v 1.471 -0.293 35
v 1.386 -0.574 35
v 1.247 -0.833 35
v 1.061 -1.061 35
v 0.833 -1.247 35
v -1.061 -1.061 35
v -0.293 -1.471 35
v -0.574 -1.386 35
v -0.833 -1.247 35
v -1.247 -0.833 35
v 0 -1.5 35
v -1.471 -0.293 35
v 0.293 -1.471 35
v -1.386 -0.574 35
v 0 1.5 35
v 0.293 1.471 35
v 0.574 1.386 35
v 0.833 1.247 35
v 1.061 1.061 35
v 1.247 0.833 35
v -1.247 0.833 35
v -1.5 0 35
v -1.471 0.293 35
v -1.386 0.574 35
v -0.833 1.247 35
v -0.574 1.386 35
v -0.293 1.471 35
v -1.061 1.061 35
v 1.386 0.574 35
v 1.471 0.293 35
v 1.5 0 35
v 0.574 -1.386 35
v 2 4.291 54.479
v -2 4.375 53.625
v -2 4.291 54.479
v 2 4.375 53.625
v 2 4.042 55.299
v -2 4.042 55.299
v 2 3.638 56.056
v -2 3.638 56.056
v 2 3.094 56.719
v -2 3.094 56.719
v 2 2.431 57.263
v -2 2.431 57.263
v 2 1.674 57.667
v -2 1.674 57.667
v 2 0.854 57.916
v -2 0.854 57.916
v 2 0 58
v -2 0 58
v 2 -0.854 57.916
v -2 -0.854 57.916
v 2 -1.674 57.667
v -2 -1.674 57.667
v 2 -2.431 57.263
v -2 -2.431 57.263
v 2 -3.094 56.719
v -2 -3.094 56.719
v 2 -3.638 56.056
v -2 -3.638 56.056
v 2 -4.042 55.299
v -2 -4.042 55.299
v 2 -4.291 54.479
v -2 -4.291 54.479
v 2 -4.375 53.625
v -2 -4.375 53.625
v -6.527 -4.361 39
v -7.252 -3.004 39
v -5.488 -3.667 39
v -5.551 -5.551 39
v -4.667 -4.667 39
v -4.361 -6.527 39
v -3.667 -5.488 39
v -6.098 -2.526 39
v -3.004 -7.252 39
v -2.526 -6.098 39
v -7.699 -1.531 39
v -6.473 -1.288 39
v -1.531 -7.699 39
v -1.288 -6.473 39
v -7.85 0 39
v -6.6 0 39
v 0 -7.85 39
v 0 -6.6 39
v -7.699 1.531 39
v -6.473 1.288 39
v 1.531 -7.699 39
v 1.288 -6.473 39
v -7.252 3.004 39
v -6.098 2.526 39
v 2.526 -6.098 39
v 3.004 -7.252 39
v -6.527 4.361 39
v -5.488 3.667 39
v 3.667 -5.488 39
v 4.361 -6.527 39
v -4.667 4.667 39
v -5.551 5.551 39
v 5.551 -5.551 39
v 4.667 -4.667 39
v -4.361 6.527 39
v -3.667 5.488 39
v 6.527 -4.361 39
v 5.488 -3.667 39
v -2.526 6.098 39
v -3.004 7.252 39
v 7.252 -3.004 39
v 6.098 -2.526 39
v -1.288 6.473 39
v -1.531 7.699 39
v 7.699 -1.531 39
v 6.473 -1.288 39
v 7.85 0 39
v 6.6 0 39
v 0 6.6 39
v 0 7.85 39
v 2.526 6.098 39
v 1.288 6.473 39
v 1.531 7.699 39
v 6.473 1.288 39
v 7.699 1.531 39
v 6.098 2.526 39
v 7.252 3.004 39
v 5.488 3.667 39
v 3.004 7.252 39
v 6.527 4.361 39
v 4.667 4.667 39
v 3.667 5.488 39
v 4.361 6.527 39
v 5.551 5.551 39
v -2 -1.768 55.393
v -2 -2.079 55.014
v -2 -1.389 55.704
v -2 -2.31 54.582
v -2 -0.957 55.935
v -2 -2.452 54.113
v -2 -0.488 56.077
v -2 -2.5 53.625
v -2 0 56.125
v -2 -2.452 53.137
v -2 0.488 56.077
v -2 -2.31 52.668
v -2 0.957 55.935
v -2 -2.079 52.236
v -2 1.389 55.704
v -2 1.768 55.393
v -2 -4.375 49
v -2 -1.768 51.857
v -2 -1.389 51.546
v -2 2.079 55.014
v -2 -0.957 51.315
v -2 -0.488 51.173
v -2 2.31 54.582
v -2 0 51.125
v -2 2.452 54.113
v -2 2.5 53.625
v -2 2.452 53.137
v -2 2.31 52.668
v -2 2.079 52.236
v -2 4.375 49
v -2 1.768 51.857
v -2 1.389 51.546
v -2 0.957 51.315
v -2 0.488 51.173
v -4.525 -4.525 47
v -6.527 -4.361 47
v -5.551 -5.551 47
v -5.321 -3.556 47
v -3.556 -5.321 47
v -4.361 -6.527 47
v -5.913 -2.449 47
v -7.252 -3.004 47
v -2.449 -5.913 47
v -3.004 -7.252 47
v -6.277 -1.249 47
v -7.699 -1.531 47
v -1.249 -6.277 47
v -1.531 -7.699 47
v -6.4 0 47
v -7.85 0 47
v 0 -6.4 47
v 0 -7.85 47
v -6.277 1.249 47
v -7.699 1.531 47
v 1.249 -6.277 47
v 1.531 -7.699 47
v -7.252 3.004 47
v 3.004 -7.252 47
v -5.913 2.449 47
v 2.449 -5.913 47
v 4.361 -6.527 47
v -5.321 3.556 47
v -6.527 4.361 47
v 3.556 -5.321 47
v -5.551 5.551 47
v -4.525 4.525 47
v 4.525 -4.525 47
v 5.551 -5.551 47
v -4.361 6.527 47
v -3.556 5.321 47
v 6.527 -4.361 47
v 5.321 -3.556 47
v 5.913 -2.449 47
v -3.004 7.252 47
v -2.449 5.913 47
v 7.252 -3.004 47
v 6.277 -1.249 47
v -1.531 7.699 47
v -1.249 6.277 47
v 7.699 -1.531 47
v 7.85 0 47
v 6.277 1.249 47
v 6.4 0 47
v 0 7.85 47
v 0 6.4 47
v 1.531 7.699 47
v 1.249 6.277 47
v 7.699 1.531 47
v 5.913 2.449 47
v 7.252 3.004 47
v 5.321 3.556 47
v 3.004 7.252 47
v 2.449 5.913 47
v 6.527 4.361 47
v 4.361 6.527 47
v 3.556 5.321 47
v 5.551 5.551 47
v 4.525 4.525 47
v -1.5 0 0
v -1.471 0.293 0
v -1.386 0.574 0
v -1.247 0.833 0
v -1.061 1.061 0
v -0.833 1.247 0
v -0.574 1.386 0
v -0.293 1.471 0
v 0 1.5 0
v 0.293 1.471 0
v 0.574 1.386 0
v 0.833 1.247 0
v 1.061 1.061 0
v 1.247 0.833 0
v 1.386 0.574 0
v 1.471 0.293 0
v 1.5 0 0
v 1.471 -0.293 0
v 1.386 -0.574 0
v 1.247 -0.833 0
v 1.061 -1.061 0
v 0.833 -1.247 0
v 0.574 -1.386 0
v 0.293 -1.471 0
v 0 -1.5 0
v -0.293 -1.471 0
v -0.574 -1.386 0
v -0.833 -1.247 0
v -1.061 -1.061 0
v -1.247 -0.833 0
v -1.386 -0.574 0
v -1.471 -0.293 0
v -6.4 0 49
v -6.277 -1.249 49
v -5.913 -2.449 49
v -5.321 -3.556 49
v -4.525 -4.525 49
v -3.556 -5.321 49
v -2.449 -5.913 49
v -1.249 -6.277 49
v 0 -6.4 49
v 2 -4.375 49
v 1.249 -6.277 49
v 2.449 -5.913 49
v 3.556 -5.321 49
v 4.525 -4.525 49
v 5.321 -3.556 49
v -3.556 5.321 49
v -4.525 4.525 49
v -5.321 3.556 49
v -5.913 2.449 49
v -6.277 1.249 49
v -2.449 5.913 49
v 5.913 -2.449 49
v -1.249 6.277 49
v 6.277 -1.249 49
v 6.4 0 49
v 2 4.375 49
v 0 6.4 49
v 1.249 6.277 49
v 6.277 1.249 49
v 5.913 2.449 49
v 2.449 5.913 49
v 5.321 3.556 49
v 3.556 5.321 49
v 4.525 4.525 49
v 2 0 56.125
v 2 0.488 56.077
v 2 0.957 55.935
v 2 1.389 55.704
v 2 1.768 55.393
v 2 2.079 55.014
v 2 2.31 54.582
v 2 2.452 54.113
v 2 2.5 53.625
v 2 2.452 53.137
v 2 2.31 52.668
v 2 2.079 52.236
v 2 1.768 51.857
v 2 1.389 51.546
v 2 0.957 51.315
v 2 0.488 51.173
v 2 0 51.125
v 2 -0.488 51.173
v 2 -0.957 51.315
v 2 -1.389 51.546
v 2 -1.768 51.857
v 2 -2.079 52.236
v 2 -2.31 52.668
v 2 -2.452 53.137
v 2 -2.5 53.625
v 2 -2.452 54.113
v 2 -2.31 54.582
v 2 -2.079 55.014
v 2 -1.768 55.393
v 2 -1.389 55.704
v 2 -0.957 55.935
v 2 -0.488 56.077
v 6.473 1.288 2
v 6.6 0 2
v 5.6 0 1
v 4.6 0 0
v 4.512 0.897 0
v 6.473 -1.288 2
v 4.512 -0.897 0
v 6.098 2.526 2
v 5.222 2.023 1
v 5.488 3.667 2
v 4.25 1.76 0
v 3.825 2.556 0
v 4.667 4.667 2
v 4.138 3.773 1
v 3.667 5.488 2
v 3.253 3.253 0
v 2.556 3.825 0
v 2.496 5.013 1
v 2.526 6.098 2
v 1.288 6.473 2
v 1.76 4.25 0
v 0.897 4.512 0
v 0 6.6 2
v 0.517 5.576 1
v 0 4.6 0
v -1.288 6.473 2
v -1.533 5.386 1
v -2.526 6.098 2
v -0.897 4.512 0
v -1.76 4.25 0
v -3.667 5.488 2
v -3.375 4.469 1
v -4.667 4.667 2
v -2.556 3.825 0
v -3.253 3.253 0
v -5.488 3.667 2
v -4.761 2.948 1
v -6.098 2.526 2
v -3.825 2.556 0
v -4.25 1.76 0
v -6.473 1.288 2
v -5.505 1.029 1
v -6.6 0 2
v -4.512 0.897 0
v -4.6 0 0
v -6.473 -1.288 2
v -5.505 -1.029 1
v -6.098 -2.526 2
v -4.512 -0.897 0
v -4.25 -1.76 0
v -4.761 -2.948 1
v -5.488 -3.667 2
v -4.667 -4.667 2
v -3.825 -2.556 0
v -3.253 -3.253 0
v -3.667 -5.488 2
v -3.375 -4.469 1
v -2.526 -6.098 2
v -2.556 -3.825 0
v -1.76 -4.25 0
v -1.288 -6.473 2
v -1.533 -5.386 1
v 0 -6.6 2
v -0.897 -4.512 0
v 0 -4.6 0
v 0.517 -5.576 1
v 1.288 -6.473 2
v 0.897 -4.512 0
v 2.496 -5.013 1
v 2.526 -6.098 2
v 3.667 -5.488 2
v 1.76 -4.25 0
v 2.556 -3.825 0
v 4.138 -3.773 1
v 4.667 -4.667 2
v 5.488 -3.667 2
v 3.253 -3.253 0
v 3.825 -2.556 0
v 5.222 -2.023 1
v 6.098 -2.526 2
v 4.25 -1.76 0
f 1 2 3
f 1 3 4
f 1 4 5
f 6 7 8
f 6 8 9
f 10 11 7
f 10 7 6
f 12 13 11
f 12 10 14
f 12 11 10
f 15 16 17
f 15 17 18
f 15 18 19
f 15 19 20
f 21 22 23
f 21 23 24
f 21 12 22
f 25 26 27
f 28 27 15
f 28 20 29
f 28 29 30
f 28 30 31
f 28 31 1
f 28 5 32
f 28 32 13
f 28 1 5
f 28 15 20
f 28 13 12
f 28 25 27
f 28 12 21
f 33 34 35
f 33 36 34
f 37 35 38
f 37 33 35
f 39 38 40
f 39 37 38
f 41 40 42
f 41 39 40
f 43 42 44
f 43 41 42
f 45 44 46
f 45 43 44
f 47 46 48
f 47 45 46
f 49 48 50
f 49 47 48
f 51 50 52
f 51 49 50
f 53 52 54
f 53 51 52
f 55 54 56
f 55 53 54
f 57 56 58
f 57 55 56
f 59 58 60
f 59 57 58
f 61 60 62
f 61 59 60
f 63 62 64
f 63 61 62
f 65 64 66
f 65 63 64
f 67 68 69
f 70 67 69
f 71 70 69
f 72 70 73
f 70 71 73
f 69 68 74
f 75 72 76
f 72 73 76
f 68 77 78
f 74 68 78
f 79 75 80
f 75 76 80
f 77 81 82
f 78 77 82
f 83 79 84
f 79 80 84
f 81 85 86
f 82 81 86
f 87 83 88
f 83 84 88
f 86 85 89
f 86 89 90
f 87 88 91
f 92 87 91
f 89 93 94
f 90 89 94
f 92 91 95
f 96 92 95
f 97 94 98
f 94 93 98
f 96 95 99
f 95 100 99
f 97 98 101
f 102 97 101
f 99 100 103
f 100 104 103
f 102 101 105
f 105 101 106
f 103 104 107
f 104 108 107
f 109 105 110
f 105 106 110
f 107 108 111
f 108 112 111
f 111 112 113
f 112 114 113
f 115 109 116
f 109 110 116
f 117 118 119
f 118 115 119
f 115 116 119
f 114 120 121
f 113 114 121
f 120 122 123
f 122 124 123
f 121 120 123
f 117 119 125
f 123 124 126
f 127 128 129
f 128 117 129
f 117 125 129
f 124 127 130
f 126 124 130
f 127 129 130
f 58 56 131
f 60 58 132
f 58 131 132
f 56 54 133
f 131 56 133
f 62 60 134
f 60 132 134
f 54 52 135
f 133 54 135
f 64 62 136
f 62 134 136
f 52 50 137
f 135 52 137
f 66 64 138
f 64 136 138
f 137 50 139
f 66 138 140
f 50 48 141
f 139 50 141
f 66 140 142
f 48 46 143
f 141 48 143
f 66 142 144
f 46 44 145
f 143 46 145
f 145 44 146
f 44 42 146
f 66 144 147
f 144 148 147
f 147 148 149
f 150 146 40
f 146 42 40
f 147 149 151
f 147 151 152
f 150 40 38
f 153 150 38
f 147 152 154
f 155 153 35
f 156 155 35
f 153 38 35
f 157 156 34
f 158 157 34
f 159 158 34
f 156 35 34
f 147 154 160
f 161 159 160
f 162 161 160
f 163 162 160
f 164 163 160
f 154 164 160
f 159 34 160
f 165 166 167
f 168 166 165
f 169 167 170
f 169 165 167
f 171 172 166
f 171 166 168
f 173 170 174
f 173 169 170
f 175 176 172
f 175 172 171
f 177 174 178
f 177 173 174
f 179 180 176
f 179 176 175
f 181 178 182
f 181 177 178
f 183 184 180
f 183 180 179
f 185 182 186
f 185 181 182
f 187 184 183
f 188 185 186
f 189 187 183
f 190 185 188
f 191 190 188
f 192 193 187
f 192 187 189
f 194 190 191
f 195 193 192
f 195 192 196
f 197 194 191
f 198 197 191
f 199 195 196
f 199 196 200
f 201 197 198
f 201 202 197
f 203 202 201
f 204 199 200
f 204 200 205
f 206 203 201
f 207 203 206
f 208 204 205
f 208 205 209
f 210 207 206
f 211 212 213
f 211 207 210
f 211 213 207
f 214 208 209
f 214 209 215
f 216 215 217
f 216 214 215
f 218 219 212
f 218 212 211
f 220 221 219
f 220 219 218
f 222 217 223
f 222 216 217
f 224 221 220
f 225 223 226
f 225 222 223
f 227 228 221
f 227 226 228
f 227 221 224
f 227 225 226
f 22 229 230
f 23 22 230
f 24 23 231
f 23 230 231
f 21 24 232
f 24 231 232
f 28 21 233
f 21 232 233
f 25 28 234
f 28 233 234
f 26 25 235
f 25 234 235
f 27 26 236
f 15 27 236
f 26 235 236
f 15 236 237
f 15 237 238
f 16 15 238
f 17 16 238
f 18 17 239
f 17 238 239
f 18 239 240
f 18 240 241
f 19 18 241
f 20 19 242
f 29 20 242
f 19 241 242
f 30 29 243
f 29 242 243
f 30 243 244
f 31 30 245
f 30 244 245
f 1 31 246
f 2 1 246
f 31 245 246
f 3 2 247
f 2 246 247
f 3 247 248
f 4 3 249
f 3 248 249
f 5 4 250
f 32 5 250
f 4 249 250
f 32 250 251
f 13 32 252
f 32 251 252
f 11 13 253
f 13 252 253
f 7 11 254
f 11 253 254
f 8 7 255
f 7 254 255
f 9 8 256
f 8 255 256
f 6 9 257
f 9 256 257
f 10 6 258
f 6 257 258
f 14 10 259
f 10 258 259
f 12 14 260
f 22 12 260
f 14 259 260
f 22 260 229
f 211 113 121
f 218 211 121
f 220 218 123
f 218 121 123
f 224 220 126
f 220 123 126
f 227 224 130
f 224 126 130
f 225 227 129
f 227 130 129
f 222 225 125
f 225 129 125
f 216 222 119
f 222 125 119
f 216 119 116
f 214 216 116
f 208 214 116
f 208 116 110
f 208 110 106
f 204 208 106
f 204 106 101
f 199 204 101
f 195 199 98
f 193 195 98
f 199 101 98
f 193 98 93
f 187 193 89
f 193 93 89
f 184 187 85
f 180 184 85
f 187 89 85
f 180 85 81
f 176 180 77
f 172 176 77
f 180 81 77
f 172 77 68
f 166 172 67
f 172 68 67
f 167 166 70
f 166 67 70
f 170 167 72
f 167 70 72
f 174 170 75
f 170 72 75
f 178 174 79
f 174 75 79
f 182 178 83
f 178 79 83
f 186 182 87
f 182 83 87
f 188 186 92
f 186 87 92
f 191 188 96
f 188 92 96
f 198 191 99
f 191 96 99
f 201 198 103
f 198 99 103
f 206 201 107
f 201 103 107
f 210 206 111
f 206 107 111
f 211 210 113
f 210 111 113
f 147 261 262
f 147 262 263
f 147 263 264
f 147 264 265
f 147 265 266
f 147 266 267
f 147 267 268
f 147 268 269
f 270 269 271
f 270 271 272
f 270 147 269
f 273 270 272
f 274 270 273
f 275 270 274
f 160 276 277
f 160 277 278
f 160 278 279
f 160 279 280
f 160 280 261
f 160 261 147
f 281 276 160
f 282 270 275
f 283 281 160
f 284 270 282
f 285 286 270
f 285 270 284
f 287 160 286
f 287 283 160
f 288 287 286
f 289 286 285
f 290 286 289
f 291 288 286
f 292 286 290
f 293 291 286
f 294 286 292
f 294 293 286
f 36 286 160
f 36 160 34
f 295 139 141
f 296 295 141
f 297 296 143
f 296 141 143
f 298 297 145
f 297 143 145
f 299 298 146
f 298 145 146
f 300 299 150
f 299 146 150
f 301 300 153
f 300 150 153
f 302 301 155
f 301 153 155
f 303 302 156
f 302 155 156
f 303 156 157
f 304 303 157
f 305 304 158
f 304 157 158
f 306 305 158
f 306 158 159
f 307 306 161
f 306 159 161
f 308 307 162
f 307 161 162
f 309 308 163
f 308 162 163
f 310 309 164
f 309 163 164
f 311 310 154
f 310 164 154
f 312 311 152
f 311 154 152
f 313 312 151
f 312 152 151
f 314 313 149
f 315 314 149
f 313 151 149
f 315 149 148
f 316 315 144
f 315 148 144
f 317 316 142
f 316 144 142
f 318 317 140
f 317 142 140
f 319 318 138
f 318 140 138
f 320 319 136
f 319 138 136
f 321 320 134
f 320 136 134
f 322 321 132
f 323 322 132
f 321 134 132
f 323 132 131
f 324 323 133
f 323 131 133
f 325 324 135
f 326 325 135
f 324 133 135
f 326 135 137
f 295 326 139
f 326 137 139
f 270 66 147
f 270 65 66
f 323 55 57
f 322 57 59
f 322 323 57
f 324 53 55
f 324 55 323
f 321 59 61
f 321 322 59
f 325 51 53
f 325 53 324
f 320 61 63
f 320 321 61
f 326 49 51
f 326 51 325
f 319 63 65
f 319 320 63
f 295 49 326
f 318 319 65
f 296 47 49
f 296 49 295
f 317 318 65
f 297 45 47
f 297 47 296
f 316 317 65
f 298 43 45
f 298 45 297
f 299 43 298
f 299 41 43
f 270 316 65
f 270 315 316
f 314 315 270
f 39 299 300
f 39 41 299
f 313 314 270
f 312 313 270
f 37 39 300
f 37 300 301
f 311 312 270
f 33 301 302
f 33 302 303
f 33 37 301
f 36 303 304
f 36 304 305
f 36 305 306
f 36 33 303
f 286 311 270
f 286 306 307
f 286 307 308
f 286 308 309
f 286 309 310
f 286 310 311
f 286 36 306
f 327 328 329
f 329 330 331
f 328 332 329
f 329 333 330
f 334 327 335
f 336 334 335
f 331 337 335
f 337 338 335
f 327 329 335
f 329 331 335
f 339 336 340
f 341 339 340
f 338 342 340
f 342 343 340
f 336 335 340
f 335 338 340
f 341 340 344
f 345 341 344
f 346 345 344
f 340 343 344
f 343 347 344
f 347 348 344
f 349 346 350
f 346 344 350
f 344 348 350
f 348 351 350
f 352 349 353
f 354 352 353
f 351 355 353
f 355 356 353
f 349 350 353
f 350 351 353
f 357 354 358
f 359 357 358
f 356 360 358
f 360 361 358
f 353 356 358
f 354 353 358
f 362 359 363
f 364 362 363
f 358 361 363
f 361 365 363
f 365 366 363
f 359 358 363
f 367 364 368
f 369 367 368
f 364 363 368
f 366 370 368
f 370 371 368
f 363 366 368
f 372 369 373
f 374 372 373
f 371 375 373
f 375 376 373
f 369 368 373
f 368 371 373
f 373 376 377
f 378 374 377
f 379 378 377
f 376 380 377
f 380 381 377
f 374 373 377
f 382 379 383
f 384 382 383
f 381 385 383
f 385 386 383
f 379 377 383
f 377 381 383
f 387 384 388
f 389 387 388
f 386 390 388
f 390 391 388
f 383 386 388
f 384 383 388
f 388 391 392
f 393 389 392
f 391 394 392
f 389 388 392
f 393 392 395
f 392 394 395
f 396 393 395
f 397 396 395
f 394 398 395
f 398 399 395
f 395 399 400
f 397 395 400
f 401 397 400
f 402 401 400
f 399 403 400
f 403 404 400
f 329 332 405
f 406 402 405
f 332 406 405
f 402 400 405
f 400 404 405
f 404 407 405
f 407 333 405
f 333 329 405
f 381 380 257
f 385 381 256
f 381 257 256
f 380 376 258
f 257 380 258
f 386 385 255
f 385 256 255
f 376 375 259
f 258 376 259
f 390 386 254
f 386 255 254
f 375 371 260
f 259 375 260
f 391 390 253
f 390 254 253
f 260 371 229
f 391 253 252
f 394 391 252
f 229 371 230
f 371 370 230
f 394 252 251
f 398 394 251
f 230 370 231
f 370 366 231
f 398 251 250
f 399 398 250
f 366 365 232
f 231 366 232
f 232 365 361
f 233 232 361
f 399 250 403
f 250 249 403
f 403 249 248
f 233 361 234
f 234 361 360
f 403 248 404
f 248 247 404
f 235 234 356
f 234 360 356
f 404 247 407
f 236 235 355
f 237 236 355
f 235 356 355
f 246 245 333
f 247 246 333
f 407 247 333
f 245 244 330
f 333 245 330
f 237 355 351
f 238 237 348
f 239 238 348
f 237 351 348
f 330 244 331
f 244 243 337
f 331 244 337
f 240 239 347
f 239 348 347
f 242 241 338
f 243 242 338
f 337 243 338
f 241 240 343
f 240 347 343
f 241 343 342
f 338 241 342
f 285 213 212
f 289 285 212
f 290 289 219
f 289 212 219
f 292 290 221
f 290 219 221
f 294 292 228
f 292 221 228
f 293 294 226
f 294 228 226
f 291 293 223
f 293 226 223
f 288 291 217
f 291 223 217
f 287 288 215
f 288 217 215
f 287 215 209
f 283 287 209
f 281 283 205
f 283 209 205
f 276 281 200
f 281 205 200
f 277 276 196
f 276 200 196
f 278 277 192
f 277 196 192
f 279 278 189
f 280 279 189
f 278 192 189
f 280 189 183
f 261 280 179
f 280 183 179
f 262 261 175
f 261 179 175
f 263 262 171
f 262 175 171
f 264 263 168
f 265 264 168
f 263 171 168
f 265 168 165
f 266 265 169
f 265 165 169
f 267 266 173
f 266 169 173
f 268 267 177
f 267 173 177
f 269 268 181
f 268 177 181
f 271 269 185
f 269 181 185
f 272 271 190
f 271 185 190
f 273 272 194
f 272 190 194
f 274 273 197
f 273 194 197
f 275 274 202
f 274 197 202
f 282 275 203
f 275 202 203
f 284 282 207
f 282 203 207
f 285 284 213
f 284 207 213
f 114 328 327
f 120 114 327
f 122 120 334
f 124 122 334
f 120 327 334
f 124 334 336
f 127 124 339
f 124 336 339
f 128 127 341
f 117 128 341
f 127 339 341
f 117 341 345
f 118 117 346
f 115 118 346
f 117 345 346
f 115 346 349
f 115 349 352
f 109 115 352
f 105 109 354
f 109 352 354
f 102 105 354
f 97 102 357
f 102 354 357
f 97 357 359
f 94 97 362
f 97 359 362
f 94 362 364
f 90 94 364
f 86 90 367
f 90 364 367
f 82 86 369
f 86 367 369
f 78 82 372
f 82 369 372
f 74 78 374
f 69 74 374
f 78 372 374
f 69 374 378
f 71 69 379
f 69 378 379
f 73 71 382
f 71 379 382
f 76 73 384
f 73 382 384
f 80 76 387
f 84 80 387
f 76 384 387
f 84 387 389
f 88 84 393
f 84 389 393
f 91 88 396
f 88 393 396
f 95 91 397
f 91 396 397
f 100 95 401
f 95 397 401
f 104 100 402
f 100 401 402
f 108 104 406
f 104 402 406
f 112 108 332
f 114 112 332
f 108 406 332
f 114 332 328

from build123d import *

# Parameters (mm, degrees)
SKETCH2_R            = 6.6
EXTERNAL_SHOCK_DEPTH = 39
SHOCK_CHAMFER_SIZE   = 2
SKETCH3_R            = 7.85
CYLINDER_A_DEPTH     = 8
SKETCH4_R            = 6.4
CYLINDER_B_DEPTH     = 2
MOUNTING_BOSS_DEPTH  = 2
SKETCH6_R            = 2.5
MOUNTING_HOLE_DEPTH  = 4
SKETCH7_R            = 1.5
INNER_HOLE_DEPTH     = 35


with BuildPart() as part:
    # Sketch2 → External Shock (new body)
    with BuildSketch(Plane.XY):
        Circle(SKETCH2_R)
    extrude(amount=EXTERNAL_SHOCK_DEPTH)

    # Shock Chamfer
    shock_chamfer_edges = [part.edges().sort_by_distance(p)[0] for p in [
        (-6.6, 0, 0),
    ]]
    chamfer(shock_chamfer_edges, length=SHOCK_CHAMFER_SIZE)

    # Sketch3 → Cylinder A (add)
    with BuildSketch(Plane.XY.offset(39)):
        Circle(SKETCH3_R)
    extrude(amount=CYLINDER_A_DEPTH)

    # Sketch4 → Cylinder B (add)
    with BuildSketch(Plane.XY.offset(47)):
        Circle(SKETCH4_R)
    extrude(amount=CYLINDER_B_DEPTH)

    # Sketch5 → Mounting Boss (add, symmetric)
    with BuildSketch(Plane(origin=(0, 0, 0), x_dir=(0, 0, -1), z_dir=(1, 0, 0))):
        with BuildLine():
            Line((-53.625, -4.375), (-49, -4.375))
            Line((-49, -4.375), (-49, 4.375))
            Line((-49, 4.375), (-53.625, 4.375))
            ThreePointArc((-53.625, 4.375), (-58, 0), (-53.625, -4.375))
        make_face()
    extrude(amount=MOUNTING_BOSS_DEPTH, both=True)

    # Sketch6 → Mounting Hole (cut)
    with BuildSketch(Plane.ZY.offset(2)):
        with Locations((53.625, 0)):
            Circle(SKETCH6_R)
    extrude(amount=-MOUNTING_HOLE_DEPTH, mode=Mode.SUBTRACT)

    # Sketch7 → Inner Hole (cut)
    with BuildSketch(Plane(origin=(0, 0, 0), x_dir=(-1, 0, 0), z_dir=(0, 0, -1))):
        Circle(SKETCH7_R)
    extrude(amount=-INNER_HOLE_DEPTH, mode=Mode.SUBTRACT)


solid = part.part
